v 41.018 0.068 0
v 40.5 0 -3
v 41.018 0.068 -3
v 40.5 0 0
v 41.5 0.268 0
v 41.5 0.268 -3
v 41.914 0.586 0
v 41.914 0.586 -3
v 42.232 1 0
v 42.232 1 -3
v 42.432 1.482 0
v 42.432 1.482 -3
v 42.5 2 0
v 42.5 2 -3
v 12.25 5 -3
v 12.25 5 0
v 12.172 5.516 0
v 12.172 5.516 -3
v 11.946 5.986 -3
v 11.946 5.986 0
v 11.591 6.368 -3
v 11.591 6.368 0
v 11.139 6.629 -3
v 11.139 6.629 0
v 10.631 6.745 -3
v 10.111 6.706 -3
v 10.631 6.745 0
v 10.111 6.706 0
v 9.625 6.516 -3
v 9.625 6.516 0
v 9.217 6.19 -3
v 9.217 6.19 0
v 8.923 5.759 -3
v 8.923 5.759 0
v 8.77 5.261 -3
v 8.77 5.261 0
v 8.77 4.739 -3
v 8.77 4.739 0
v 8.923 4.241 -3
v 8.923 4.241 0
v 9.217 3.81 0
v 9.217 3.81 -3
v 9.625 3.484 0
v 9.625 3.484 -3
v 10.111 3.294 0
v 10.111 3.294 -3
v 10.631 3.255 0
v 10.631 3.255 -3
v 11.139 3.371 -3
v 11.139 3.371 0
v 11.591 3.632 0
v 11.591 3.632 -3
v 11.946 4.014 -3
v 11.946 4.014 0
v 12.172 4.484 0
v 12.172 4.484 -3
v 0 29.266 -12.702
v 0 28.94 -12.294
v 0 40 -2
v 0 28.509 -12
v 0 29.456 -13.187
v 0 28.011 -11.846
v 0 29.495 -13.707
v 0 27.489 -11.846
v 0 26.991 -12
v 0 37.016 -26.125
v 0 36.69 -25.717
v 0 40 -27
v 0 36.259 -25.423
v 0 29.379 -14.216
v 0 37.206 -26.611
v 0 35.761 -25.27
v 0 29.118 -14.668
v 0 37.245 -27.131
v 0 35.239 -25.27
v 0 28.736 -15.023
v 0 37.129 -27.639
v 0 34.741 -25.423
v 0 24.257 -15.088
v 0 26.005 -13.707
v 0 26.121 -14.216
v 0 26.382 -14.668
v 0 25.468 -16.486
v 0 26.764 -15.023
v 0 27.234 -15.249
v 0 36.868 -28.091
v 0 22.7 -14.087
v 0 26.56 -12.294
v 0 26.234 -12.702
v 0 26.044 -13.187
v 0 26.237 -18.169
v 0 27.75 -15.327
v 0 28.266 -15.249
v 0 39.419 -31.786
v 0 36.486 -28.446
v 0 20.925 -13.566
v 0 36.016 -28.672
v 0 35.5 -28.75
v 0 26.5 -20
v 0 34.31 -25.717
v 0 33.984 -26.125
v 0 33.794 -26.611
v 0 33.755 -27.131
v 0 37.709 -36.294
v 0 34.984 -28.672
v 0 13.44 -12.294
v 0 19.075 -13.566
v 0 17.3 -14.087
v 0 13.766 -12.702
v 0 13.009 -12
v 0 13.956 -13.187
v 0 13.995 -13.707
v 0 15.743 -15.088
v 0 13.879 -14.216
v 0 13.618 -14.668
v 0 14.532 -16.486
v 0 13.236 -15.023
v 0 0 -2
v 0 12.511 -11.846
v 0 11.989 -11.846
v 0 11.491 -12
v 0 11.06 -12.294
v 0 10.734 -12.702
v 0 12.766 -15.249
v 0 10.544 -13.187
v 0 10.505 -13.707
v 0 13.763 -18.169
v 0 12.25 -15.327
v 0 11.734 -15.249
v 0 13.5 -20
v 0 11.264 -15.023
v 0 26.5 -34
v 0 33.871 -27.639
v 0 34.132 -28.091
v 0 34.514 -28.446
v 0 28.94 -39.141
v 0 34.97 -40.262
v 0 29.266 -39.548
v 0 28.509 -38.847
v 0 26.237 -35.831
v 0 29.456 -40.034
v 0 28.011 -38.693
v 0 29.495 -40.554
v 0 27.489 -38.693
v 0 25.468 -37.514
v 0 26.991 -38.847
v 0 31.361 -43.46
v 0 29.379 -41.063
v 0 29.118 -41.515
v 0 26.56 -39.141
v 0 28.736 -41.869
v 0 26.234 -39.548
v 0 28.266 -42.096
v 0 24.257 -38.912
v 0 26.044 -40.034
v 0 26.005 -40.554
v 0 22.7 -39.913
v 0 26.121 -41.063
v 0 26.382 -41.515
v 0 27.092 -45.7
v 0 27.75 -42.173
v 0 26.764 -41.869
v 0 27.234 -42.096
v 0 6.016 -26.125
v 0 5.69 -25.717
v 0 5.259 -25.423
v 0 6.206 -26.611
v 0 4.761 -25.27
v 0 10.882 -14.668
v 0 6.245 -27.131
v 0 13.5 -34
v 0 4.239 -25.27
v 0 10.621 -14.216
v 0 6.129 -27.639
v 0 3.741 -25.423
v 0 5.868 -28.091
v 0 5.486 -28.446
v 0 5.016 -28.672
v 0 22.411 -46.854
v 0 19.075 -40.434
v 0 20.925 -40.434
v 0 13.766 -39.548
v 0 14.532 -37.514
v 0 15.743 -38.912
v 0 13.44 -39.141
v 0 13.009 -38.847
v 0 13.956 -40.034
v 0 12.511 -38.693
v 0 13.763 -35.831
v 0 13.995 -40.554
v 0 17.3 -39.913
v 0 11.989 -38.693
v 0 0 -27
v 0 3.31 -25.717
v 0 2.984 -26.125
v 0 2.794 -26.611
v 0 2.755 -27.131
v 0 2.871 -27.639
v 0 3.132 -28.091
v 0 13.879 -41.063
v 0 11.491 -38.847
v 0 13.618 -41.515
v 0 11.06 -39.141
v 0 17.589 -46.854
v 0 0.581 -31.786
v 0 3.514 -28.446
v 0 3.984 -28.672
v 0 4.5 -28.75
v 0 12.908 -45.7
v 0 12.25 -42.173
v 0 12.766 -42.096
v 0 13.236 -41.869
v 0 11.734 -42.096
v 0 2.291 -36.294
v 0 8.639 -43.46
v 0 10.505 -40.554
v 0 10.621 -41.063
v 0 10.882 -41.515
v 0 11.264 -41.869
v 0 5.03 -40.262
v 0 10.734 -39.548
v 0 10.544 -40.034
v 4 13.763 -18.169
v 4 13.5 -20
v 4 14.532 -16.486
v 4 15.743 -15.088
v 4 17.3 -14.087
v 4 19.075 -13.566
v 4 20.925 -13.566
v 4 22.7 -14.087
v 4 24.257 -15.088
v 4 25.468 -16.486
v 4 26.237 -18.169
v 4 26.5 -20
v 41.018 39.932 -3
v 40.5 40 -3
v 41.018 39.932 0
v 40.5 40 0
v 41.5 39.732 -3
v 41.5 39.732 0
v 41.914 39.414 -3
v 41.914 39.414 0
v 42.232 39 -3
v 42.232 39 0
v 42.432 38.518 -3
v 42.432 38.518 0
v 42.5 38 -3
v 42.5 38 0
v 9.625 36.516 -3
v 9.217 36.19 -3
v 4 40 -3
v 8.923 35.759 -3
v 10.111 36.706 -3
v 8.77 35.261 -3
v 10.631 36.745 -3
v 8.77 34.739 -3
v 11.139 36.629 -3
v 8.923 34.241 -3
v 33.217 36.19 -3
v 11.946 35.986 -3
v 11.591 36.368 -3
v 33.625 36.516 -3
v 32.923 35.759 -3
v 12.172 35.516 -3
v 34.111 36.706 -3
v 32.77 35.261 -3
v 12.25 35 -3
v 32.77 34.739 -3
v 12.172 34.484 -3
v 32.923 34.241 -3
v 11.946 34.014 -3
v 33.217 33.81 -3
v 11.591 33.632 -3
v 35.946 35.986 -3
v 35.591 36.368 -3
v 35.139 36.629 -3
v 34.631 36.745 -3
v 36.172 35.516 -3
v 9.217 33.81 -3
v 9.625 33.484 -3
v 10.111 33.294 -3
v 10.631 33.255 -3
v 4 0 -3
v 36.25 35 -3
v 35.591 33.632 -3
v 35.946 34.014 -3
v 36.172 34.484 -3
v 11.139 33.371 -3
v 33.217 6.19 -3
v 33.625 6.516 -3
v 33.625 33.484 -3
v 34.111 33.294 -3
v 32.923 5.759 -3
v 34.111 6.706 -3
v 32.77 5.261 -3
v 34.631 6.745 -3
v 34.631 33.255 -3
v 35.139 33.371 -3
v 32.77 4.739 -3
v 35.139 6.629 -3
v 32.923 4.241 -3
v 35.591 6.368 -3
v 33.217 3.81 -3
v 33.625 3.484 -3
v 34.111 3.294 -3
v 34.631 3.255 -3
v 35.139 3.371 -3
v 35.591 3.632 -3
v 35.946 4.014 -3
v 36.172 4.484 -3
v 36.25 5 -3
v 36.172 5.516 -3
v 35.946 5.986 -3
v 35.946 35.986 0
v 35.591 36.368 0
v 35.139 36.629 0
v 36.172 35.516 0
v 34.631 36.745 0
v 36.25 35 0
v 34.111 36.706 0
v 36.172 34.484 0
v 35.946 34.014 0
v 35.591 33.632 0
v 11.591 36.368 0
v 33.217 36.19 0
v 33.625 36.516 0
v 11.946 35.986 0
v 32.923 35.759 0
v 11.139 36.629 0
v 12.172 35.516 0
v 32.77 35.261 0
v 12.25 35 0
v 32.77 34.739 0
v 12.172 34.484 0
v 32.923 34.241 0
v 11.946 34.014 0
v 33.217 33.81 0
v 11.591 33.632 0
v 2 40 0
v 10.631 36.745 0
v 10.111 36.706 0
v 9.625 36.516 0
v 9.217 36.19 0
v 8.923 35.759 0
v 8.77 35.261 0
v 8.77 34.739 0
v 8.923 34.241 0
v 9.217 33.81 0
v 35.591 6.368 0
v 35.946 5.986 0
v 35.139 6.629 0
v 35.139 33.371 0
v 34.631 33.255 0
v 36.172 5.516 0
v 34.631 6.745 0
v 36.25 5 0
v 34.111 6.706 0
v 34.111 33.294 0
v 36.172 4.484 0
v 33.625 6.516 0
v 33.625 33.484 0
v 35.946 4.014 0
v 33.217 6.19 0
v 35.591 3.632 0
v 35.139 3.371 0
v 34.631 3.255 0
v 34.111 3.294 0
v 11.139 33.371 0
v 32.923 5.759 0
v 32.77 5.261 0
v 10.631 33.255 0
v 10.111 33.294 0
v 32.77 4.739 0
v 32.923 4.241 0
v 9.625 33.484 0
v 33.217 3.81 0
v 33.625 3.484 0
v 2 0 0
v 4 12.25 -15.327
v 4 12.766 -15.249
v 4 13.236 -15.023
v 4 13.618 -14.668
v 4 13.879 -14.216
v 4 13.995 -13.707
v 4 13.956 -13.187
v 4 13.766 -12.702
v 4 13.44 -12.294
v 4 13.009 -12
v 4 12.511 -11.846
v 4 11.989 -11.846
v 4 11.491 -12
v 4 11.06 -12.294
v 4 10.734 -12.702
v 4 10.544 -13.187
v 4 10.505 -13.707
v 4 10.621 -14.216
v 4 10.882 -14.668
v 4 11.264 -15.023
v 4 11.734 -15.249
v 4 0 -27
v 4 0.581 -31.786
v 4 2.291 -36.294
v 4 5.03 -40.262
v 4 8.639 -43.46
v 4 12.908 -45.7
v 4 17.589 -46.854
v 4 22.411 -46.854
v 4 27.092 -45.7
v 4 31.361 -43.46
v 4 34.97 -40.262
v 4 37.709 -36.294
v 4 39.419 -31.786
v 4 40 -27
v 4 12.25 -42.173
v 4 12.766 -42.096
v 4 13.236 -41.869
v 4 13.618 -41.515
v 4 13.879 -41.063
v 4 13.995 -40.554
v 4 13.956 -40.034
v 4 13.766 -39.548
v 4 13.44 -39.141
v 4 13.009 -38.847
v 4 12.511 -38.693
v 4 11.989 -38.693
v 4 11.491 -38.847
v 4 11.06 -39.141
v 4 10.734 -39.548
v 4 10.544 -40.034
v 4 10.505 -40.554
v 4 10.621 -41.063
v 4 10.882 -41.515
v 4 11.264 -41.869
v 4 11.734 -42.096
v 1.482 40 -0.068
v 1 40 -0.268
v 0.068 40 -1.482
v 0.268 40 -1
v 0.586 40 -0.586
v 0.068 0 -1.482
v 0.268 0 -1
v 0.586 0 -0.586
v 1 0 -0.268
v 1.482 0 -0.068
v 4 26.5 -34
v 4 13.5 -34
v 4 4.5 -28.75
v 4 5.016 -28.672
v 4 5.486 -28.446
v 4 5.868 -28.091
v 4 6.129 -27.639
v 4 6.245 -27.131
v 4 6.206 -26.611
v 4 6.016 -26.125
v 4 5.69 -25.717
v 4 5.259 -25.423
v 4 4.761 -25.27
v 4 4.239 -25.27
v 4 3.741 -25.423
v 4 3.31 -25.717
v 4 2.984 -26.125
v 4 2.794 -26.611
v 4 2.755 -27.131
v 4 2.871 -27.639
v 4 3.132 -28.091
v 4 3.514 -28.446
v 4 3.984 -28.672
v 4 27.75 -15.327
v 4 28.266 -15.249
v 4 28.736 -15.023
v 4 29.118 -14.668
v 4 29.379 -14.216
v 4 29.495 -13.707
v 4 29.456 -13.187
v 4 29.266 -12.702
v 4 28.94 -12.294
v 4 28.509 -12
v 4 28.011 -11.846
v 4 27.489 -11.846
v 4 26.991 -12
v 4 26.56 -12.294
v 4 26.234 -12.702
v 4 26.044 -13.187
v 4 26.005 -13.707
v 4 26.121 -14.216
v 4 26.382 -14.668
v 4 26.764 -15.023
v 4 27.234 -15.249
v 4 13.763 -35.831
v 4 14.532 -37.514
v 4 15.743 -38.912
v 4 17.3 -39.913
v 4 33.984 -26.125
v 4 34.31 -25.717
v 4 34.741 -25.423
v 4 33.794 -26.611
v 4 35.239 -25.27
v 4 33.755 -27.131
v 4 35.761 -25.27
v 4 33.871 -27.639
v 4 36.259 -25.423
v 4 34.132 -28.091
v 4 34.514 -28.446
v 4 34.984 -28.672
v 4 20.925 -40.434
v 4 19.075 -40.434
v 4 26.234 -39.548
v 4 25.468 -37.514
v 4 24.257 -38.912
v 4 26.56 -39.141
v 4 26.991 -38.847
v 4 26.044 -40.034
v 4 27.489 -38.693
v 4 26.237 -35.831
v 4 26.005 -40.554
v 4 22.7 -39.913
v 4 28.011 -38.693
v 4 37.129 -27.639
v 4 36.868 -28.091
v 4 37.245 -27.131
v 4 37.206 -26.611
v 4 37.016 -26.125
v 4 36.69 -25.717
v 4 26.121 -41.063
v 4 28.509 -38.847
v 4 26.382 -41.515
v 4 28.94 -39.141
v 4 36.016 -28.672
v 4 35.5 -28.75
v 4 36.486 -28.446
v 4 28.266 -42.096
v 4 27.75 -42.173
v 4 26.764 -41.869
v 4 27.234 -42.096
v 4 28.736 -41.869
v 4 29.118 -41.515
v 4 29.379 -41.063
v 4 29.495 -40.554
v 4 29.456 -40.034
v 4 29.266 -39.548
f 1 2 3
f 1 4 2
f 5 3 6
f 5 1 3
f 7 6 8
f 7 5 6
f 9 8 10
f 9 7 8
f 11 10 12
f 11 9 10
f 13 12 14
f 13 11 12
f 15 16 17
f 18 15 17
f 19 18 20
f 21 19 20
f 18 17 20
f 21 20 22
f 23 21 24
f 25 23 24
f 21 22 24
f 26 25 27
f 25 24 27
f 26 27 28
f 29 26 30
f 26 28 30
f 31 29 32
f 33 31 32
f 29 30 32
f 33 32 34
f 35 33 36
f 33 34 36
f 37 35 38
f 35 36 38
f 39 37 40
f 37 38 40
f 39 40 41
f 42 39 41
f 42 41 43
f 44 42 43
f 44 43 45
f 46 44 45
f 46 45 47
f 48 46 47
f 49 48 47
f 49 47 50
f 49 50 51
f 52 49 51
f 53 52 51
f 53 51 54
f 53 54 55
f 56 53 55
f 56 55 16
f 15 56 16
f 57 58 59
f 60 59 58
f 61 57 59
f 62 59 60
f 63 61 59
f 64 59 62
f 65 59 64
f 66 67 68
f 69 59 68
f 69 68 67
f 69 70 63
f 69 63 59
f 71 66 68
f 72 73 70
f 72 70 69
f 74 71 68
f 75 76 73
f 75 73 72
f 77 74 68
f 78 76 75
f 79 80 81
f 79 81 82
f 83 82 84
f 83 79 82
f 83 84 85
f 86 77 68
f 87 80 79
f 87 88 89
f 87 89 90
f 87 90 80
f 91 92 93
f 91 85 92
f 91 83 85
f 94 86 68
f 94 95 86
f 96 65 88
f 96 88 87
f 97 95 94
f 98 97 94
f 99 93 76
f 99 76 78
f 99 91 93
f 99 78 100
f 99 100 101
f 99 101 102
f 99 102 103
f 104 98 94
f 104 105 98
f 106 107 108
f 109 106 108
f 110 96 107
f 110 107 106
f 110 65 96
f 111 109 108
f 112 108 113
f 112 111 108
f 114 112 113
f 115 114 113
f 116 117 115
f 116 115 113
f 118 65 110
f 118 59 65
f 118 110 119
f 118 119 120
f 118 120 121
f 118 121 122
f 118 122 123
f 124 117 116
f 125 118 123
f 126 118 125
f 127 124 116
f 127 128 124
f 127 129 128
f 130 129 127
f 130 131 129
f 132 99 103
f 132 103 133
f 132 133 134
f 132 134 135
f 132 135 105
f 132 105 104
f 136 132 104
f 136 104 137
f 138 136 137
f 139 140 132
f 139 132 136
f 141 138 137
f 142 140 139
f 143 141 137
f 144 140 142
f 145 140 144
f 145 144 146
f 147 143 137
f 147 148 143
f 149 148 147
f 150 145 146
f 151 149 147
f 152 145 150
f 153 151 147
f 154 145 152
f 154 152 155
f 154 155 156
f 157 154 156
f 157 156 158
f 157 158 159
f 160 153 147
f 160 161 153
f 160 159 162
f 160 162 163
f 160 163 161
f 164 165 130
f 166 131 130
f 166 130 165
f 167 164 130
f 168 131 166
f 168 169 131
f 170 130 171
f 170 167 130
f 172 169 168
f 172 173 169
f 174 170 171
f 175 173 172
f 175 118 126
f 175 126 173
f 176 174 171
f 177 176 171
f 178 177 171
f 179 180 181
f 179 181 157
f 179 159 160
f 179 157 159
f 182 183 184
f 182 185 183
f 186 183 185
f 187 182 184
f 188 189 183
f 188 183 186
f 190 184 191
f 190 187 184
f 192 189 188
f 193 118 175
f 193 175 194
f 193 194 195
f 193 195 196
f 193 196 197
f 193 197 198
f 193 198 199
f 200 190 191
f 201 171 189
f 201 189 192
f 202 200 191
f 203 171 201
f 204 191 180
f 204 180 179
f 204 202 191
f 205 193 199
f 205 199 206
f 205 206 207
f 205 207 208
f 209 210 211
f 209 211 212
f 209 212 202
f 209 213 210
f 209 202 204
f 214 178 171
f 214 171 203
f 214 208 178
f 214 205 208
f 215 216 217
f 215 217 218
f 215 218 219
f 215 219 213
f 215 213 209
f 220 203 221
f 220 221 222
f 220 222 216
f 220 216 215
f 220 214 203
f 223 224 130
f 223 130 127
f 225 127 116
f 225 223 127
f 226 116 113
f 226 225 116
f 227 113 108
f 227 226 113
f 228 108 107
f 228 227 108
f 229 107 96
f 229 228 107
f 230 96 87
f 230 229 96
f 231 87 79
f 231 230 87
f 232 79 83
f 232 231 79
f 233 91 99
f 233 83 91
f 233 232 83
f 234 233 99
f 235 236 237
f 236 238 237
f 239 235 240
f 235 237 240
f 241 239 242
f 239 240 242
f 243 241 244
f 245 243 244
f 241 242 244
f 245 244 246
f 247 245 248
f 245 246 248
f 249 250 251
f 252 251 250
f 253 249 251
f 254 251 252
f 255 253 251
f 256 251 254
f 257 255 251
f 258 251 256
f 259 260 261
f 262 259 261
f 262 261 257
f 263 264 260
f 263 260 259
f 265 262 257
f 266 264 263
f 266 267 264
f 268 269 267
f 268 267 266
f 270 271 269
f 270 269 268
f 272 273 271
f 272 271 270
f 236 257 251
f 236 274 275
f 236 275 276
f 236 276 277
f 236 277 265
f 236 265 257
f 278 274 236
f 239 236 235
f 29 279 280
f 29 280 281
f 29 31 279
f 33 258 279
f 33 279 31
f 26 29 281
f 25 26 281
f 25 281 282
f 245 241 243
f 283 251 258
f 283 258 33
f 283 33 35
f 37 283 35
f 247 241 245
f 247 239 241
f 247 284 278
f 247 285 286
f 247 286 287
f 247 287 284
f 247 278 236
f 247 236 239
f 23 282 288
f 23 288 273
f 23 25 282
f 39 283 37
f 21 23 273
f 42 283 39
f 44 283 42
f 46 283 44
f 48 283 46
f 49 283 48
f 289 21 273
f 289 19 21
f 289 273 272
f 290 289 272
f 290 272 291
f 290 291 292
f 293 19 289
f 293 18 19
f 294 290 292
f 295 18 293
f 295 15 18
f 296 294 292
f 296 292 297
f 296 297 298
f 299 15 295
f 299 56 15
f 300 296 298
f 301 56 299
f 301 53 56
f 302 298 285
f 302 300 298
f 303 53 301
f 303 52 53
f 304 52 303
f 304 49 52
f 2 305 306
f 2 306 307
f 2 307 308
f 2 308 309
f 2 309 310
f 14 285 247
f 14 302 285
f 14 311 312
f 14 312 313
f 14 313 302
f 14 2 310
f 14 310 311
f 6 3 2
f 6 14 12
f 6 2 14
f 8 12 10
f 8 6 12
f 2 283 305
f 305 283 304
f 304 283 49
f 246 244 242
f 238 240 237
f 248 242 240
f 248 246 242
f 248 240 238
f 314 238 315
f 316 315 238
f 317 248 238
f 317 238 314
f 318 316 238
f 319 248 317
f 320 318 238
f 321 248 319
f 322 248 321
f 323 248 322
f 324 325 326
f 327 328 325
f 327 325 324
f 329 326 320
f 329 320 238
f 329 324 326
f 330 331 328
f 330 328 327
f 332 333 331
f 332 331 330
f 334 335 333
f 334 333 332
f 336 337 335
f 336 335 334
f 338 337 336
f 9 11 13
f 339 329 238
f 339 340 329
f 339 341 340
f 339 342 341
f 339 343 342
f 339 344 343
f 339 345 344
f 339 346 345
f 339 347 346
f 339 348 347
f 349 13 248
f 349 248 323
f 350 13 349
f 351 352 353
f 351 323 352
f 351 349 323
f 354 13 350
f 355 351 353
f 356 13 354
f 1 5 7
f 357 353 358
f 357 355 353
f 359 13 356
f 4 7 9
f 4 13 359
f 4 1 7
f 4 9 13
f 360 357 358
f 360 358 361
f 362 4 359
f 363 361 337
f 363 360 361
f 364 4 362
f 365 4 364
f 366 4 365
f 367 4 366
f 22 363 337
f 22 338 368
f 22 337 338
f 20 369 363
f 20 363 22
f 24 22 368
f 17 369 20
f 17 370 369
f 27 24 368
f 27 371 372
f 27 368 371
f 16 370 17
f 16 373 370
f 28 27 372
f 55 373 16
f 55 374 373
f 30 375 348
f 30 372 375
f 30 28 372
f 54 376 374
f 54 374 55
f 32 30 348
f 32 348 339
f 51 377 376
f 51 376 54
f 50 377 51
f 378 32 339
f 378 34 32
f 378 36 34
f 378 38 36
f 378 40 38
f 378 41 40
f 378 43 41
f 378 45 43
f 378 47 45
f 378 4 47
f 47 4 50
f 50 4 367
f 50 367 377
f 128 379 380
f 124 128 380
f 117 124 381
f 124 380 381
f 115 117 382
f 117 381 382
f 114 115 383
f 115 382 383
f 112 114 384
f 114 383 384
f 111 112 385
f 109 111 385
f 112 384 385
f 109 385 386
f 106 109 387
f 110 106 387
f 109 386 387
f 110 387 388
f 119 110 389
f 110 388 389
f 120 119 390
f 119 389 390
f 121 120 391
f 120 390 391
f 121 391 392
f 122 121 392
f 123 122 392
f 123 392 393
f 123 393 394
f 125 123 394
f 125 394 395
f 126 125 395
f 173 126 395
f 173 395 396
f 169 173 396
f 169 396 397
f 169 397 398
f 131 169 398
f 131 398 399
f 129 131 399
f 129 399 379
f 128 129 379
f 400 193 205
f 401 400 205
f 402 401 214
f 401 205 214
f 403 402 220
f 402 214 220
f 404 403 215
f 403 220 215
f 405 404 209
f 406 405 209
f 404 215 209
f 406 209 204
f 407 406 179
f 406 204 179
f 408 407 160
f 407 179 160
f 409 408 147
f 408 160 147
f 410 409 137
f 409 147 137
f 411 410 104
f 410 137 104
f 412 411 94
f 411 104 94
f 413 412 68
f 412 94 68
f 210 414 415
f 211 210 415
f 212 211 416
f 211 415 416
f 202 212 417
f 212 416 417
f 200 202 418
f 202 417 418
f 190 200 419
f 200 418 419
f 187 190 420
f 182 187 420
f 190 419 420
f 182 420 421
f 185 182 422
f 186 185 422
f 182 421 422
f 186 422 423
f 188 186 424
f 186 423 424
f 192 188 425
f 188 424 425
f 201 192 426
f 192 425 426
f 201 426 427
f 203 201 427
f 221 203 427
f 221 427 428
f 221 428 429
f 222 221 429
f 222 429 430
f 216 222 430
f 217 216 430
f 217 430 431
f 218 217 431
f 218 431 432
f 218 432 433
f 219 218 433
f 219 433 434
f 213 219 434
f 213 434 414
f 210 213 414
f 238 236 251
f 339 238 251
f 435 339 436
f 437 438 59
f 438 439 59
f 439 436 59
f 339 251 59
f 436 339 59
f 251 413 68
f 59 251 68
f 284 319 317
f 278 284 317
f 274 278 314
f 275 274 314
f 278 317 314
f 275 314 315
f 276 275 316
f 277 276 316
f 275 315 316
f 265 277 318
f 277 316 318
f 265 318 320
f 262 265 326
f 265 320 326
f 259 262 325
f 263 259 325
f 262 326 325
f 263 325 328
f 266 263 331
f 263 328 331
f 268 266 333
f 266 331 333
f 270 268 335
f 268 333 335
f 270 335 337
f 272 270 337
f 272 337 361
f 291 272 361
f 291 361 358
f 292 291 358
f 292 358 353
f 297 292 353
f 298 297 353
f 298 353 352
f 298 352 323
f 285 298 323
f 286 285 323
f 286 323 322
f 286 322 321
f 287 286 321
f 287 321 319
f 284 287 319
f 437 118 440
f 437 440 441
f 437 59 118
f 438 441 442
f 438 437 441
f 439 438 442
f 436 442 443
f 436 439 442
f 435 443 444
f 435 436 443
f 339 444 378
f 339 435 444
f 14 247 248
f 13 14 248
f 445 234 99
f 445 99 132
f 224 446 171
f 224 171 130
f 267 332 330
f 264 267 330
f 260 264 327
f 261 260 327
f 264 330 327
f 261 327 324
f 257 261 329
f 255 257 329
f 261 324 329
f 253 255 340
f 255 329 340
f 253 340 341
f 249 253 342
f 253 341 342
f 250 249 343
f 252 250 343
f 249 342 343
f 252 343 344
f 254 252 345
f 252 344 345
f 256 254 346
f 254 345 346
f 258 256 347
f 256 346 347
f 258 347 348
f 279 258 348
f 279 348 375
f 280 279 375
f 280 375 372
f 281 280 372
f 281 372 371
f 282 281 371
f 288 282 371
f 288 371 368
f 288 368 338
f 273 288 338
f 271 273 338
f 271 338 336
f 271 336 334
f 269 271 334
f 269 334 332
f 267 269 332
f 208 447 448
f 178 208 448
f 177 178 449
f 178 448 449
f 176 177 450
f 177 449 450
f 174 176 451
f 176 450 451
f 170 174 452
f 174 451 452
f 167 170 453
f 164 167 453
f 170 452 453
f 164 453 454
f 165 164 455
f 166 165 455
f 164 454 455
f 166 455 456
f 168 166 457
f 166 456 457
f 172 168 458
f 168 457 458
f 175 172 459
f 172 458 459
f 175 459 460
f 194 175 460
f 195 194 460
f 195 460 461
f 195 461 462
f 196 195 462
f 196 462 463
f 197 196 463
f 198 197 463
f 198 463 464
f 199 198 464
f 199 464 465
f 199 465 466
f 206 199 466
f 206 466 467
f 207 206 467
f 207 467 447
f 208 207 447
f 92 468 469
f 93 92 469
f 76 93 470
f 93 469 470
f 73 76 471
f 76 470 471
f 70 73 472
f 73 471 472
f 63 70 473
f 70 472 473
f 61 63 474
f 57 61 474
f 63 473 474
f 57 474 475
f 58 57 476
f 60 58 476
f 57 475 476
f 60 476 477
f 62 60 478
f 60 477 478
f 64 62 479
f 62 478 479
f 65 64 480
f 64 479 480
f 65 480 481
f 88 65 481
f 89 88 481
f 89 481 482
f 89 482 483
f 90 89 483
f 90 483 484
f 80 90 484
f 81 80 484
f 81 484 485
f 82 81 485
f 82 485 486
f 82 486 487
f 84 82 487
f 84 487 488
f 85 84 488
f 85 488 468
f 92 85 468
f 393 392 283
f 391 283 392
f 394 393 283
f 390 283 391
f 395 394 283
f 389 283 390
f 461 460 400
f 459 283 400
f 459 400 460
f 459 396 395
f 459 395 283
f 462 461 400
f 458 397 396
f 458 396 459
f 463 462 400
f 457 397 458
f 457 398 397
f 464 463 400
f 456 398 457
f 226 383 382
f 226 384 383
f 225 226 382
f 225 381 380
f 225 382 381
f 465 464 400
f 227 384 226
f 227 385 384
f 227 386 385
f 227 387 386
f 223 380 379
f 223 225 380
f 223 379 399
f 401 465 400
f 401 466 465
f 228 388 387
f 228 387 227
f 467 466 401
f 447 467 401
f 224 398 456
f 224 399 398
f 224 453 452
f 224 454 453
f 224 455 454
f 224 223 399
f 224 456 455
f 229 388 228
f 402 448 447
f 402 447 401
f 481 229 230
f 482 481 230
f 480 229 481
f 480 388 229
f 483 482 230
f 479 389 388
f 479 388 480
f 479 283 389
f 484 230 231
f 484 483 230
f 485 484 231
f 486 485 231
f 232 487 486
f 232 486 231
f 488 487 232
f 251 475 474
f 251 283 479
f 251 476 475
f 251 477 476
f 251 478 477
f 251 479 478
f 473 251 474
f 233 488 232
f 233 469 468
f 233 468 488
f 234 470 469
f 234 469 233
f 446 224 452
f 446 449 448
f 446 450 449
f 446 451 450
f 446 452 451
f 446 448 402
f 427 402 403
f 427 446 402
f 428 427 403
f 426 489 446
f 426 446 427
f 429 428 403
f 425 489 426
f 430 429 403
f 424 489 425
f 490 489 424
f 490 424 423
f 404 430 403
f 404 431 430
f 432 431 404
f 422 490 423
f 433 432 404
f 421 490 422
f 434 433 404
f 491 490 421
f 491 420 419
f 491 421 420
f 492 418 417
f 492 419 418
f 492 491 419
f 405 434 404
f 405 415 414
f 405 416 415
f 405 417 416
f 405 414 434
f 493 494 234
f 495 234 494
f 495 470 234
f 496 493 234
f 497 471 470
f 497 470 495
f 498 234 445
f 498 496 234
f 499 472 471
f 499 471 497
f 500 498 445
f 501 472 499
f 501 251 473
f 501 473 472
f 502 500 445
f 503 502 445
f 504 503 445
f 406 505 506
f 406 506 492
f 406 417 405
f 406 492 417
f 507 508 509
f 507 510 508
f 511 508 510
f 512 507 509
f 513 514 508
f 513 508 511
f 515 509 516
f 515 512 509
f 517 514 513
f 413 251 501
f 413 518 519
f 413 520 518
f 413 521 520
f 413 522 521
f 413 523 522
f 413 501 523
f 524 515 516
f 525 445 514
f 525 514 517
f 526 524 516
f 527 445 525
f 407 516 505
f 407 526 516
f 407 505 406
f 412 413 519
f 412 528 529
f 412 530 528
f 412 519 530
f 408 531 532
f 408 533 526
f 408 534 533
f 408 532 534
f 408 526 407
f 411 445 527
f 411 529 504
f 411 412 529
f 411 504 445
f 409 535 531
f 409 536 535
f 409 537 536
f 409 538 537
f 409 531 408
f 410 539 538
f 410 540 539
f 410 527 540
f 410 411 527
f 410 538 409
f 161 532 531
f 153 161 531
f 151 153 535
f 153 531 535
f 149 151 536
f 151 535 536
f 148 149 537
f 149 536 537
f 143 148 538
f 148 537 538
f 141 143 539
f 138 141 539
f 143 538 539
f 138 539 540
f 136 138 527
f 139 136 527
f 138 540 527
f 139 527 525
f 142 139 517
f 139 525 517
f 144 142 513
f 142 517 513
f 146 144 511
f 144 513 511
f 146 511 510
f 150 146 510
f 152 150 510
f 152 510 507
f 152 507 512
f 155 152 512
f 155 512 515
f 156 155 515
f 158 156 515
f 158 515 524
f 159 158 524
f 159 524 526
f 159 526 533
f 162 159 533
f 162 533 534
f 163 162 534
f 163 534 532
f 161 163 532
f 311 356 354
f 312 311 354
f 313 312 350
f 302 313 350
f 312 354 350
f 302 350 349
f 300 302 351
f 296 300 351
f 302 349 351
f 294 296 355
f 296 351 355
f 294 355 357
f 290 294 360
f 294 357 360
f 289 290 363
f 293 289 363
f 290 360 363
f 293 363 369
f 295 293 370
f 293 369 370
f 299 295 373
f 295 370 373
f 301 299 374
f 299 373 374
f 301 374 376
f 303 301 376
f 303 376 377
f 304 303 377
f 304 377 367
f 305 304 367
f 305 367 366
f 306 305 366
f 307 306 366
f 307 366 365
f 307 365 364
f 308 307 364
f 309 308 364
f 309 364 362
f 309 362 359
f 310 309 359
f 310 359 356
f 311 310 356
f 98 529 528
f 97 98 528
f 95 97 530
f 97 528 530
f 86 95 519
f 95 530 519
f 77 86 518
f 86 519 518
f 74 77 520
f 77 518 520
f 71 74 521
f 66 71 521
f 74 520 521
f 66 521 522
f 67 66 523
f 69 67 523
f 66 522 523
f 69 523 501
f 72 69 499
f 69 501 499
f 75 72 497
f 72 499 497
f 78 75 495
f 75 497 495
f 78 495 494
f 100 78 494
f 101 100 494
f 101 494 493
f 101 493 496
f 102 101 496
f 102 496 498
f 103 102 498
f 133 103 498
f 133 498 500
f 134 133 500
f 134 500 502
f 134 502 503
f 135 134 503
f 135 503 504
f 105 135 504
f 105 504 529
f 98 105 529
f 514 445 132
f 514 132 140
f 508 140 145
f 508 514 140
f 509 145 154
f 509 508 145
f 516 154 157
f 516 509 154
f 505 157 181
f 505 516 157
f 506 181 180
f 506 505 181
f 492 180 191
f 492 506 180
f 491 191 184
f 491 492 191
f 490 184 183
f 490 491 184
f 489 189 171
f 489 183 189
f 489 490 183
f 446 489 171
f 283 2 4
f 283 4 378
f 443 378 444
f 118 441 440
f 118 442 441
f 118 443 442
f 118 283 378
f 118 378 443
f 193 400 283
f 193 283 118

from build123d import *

# Parameters (mm, degrees)
BOSS_EXTRUDE1_DEPTH      = 40
BOSS_EXTRUDE2_DEPTH      = 1
BOSS_EXTRUDE2_DEPTH_BACK = 3
CUT_EXTRUDE1_DEPTH       = 73.740978822
SKETCH5_R                = 1.75
CUT_EXTRUDE2_DEPTH       = 73.740978822
FILLET1_R                = 2
CUT_EXTRUDE3_REACH       = 76.935
SKETCH6_R                = 1.75


# Read off the part's stored shape, not the designer's step: moBlkMgr[Ga_GB37]
with BuildPart() as part:
    # Sketch1 → Boss-Extrude1 (new body)
    with BuildSketch(Plane(origin=(0, 0, 0), x_dir=(1, 0, 0), z_dir=(0, 1, 0))):
        Polygon((0, 0), (0, 27), (3, 27), (3, 3), (42.5, 3), (42.5, 0), align=None)
    extrude(amount=BOSS_EXTRUDE1_DEPTH)

    # Sketch2 → Boss-Extrude2 (add, two sides: drawn at the far end of the back side and taken through both)
    with BuildSketch(Plane(origin=(3, 0, 0), x_dir=(0, 0, -1), z_dir=(1, 0, 0)).offset(-BOSS_EXTRUDE2_DEPTH_BACK)):
        with BuildLine():
            Line((3, 0), (27, 0))
            ThreePointArc((27, 0), (47, 20), (27, 40))
            Line((27, 40), (3, 40))
            Line((3, 40), (3, 0))
        make_face()
    extrude(amount=BOSS_EXTRUDE2_DEPTH + BOSS_EXTRUDE2_DEPTH_BACK)

    # Sketch3 → Cut-Extrude1 (cut, through all)
    with BuildSketch(Plane(origin=(4, 0, 0), x_dir=(0, 0, -1), z_dir=(1, 0, 0))):
        with BuildLine():
            Line((20, 26.5), (34, 26.5))
            ThreePointArc((34, 26.5), (40.5, 20), (34, 13.5))
            Line((34, 13.5), (20, 13.5))
            ThreePointArc((20, 13.5), (13.5, 20), (20, 26.5))
        make_face()
    extrude(amount=-CUT_EXTRUDE1_DEPTH, mode=Mode.SUBTRACT)

    # Sketch5 → Cut-Extrude2 (cut, through all)
    with BuildSketch(Plane(origin=(4, 0, 0), x_dir=(0, 0, -1), z_dir=(1, 0, 0))):
        with Locations((27, 4.5)):
            Circle(SKETCH5_R)
        with Locations((13.576606241, 12.25)):
            Circle(SKETCH5_R)
        with Locations((13.576606241, 27.75)):
            Circle(SKETCH5_R)
        with Locations((27, 35.5)):
            Circle(SKETCH5_R)
        with Locations((40.423393759, 27.75)):
            Circle(SKETCH5_R)
        with Locations((40.423393759, 12.25)):
            Circle(SKETCH5_R)
    extrude(amount=-CUT_EXTRUDE2_DEPTH, mode=Mode.SUBTRACT)

    # Fillet1
    fillet1_edges = [part.edges().sort_by_distance(p)[0] for p in [
        (0, 20, 0),
        (42.5, 0, -1.5),
        (42.5, 40, -1.5),
    ]]
    fillet(fillet1_edges, radius=FILLET1_R)

    # Sketch6 → Cut-Extrude3 (cut, up to next)
    with BuildSketch(Plane.XY, mode=Mode.PRIVATE) as cut_extrude3_sk1:
        with Locations((34.5, 5)):
            Circle(SKETCH6_R)
    cut_extrude3_tool1 = extrude(cut_extrude3_sk1.sketch, amount=-CUT_EXTRUDE3_REACH, mode=Mode.PRIVATE) & part.part
    # Sketch6 → Cut-Extrude3 (cut, up to next)
    with BuildSketch(Plane.XY, mode=Mode.PRIVATE) as cut_extrude3_sk2:
        with Locations((34.5, 35)):
            Circle(SKETCH6_R)
    cut_extrude3_tool2 = extrude(cut_extrude3_sk2.sketch, amount=-CUT_EXTRUDE3_REACH, mode=Mode.PRIVATE) & part.part
    # Sketch6 → Cut-Extrude3 (cut, up to next)
    with BuildSketch(Plane.XY, mode=Mode.PRIVATE) as cut_extrude3_sk3:
        with Locations((10.5, 35)):
            Circle(SKETCH6_R)
    cut_extrude3_tool3 = extrude(cut_extrude3_sk3.sketch, amount=-CUT_EXTRUDE3_REACH, mode=Mode.PRIVATE) & part.part
    # Sketch6 → Cut-Extrude3 (cut, up to next)
    with BuildSketch(Plane.XY, mode=Mode.PRIVATE) as cut_extrude3_sk4:
        with Locations((10.5, 5)):
            Circle(SKETCH6_R)
    cut_extrude3_tool4 = extrude(cut_extrude3_sk4.sketch, amount=-CUT_EXTRUDE3_REACH, mode=Mode.PRIVATE) & part.part
    add(cut_extrude3_tool1.solids().sort_by_distance((34.5, 5, 0))[0], mode=Mode.SUBTRACT)
    add(cut_extrude3_tool2.solids().sort_by_distance((34.5, 35, 0))[0], mode=Mode.SUBTRACT)
    add(cut_extrude3_tool3.solids().sort_by_distance((10.5, 35, 0))[0], mode=Mode.SUBTRACT)
    add(cut_extrude3_tool4.solids().sort_by_distance((10.5, 5, 0))[0], mode=Mode.SUBTRACT)


solid = part.part
